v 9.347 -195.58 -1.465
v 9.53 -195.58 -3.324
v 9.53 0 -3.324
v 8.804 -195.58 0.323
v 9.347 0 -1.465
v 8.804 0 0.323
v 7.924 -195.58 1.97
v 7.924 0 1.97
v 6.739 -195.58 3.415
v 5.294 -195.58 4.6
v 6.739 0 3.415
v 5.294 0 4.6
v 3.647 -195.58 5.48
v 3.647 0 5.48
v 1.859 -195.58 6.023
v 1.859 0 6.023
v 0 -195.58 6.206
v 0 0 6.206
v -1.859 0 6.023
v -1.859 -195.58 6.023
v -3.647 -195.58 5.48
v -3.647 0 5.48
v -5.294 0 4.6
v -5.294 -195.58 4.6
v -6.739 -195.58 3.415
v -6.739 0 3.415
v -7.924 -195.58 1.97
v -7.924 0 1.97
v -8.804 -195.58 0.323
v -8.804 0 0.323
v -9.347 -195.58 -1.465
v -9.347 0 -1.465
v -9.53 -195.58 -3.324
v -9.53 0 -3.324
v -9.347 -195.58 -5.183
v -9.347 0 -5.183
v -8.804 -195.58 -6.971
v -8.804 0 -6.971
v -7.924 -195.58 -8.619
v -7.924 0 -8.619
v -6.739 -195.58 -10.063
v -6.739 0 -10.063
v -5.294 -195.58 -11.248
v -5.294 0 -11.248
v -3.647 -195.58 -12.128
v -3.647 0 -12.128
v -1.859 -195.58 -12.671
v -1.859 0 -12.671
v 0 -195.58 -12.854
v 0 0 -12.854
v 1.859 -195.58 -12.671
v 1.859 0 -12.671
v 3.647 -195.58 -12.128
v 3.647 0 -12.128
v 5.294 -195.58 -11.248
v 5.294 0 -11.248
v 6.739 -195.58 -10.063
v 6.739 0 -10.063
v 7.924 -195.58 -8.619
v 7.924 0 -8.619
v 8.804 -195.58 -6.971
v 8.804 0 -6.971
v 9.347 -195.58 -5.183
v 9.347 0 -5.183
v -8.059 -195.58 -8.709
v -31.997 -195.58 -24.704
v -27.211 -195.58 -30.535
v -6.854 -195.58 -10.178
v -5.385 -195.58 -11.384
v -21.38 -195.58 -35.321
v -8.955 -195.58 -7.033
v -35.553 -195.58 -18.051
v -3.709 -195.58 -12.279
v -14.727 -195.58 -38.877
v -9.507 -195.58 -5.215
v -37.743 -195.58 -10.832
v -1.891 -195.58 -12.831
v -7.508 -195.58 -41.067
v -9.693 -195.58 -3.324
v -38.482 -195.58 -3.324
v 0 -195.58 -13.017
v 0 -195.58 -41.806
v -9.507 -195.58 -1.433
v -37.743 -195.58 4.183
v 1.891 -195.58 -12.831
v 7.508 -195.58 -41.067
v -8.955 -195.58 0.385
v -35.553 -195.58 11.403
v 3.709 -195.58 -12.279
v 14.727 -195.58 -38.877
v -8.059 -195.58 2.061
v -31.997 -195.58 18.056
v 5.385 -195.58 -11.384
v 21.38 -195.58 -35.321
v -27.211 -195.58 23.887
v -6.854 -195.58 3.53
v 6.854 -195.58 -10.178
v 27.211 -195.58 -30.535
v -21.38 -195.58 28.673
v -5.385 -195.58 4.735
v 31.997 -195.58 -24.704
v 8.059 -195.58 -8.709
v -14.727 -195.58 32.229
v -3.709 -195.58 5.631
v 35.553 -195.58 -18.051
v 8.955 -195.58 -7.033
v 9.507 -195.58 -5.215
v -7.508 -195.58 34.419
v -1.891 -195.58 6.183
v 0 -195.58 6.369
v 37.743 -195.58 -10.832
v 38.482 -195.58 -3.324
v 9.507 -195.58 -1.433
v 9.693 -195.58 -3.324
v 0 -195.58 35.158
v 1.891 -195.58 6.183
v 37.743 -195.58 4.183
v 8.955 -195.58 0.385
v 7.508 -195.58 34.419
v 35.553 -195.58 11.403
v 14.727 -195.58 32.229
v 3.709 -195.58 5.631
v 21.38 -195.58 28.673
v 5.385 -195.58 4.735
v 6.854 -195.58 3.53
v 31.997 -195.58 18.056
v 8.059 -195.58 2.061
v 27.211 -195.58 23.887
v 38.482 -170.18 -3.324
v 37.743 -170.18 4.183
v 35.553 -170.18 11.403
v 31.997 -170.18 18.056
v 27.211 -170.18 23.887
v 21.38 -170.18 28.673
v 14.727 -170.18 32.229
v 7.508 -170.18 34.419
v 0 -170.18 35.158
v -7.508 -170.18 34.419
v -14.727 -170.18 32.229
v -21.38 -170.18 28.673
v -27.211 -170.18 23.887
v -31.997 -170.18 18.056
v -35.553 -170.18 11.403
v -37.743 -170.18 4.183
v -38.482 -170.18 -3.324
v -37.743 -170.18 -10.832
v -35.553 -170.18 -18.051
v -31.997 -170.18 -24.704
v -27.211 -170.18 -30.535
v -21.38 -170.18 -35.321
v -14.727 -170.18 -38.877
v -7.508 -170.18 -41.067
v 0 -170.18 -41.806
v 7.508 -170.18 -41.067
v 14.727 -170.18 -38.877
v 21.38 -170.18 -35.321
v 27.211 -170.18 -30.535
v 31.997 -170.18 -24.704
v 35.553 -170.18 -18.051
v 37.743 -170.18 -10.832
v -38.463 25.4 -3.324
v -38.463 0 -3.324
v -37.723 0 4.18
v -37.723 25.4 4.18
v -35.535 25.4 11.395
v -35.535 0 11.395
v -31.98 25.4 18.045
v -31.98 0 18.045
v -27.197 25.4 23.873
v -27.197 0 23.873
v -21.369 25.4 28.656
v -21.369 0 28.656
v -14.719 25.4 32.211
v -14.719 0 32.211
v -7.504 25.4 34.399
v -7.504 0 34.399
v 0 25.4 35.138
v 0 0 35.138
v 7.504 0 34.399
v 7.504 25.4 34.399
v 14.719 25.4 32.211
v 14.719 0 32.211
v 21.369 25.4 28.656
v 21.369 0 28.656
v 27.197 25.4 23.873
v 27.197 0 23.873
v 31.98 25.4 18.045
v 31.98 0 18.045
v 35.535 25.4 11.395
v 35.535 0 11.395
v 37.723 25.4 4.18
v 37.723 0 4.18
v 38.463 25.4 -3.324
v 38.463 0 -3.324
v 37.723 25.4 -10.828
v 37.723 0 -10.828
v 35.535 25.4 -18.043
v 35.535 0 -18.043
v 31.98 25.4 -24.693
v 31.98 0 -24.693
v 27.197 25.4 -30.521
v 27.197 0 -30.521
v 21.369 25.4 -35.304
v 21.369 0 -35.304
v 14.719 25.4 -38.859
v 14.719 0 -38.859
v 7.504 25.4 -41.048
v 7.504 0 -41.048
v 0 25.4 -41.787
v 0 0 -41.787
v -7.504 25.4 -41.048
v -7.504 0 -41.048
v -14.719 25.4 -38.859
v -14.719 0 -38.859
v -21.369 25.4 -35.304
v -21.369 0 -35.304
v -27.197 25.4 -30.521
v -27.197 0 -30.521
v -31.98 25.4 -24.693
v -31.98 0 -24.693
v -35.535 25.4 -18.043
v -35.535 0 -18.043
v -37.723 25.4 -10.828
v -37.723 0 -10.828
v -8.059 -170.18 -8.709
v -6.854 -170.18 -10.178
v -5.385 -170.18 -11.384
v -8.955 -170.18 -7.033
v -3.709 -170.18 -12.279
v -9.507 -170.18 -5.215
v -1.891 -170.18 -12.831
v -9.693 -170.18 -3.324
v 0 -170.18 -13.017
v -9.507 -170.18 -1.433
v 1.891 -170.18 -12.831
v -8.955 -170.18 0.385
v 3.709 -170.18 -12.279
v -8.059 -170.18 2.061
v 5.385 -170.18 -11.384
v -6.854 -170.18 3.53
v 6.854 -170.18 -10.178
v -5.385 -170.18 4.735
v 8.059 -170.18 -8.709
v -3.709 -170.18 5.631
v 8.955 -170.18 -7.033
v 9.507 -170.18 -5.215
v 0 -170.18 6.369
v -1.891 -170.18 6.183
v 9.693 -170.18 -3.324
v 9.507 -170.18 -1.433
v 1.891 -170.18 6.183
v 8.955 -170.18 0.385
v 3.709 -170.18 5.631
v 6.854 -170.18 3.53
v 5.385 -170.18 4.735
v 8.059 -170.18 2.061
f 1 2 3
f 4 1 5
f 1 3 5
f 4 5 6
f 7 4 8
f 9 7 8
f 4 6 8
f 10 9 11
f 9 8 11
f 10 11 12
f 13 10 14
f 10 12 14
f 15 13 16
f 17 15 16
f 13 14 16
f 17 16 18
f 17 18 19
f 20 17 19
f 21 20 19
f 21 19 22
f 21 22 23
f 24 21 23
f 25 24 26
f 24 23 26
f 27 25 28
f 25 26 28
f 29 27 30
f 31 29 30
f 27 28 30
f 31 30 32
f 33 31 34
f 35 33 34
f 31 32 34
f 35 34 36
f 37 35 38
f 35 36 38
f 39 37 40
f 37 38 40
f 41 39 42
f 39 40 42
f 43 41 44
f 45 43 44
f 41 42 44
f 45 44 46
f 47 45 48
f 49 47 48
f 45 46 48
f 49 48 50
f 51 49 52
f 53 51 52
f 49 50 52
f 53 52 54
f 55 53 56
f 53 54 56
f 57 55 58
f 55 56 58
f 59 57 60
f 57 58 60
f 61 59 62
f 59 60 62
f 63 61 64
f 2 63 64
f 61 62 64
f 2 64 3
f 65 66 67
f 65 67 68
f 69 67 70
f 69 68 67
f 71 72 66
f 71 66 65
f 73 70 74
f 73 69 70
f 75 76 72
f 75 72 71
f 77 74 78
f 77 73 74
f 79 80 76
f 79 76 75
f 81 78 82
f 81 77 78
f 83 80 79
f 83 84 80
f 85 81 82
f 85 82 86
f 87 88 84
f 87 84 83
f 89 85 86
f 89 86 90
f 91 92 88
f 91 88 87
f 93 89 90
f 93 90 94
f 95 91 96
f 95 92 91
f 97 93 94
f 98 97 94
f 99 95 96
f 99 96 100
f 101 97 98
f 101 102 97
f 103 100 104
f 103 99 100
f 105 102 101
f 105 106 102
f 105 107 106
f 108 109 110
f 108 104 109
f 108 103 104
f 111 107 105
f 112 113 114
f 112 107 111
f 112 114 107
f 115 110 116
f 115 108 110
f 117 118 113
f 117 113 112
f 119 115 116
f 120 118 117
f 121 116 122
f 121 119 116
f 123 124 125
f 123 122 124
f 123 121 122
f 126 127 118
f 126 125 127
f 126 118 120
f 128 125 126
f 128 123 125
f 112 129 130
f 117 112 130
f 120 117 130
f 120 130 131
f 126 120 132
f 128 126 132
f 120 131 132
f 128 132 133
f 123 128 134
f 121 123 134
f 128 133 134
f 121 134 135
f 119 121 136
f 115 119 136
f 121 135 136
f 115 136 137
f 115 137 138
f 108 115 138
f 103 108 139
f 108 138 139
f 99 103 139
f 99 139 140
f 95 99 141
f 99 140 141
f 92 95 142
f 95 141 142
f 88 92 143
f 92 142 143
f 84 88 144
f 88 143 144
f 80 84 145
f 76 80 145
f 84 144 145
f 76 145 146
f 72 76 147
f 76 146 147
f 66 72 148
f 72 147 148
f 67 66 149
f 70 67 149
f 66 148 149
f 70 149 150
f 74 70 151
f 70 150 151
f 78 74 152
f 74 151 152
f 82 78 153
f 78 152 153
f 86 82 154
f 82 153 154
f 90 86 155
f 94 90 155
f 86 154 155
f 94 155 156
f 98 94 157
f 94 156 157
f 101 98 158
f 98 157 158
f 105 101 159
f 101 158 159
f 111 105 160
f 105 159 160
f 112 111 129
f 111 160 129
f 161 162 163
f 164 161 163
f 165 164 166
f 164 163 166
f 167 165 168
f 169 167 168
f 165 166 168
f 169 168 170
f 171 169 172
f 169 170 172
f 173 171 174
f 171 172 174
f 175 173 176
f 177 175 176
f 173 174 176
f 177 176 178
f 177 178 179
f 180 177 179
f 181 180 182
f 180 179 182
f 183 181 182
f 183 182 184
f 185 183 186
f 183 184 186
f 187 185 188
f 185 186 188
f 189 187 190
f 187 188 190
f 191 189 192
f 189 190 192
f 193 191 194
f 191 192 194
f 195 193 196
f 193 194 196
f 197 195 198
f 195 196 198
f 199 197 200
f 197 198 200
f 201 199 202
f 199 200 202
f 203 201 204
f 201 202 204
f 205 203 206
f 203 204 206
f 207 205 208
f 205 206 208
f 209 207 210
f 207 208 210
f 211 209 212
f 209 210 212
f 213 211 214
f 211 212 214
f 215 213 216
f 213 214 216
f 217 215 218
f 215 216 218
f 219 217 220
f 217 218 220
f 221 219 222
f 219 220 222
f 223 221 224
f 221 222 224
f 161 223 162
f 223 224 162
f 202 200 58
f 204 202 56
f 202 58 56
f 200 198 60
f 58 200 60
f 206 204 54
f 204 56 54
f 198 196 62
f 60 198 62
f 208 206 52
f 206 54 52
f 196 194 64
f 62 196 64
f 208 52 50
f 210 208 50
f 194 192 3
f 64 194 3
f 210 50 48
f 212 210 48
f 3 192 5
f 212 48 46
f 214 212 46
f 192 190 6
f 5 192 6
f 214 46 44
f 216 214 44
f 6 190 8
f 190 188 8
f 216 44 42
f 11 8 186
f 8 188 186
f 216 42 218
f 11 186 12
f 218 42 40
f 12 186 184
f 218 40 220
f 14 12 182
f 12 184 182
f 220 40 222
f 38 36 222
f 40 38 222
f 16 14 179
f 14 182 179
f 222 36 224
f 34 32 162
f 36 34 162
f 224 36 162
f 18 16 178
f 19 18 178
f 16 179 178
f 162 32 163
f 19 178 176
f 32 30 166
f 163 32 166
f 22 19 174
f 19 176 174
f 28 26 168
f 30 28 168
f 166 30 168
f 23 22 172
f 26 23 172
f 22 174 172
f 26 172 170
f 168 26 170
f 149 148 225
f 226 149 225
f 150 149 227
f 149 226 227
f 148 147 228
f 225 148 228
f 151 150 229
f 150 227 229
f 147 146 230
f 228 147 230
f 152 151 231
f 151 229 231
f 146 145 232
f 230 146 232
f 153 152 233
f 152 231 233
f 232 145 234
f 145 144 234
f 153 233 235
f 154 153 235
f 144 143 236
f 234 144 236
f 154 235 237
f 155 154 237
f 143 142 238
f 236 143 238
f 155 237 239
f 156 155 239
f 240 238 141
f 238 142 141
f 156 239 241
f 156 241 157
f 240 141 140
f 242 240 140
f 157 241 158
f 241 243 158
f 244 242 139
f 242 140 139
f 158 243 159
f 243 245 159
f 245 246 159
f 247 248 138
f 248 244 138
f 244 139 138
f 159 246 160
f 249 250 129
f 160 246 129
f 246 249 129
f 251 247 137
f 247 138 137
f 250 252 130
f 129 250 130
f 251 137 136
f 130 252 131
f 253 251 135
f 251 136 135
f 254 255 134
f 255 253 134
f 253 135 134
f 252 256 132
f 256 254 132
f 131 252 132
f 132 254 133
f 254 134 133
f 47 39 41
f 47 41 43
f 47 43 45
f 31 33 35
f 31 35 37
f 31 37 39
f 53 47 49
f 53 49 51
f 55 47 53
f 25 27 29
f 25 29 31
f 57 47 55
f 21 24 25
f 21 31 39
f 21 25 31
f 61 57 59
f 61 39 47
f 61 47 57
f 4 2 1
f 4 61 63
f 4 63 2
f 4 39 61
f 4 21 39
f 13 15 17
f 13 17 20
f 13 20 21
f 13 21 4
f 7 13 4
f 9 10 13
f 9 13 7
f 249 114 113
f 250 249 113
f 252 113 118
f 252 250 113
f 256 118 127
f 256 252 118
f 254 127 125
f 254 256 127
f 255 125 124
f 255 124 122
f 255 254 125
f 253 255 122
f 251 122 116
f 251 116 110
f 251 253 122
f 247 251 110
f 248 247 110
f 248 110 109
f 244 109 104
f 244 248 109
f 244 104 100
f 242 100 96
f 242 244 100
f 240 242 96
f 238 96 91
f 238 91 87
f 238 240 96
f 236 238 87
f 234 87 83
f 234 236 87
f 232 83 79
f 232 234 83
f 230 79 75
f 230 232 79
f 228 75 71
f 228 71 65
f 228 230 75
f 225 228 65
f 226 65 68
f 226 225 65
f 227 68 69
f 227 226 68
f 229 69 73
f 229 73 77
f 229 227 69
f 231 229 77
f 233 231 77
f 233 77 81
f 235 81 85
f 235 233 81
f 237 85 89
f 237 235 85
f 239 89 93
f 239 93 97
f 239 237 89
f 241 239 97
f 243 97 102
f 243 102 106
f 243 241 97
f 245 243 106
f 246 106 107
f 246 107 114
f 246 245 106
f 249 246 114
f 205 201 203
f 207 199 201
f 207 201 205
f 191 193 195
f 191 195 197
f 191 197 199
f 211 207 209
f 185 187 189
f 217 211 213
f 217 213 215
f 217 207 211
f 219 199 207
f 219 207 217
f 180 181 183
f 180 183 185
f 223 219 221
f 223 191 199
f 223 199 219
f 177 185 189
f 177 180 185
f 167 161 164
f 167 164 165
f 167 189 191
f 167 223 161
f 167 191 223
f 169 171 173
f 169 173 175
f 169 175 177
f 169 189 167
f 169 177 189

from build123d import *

# Parameters (mm, degrees)
F0_R      = 9.52981
F1_DEPTH  = 170.18
F3_R      = 38.462517
F4_DEPTH  = 25.4
F2_R      = 38.482389
F2_R_2    = 9.693022
F5_DEPTH  = 25.4
F1_FACE_R = 9.52981
F6_DEPTH  = 25.4


with BuildPart() as f1:
    # F0 (on Front) → F1 (new body)
    with BuildSketch(Plane.XZ):
        with Locations((0, -3.324065)):
            Circle(F0_R)
    extrude(amount=F1_DEPTH)

    # F3 (on face) → F4 (join)
    with BuildSketch(Plane(origin=(0, 0, 0), x_dir=(-1, 0, 0), z_dir=(0, 1, 0))):
        with Locations((0, -3.324065)):
            Circle(F3_R)
    extrude(amount=F4_DEPTH)

    # F1_face (on face) → F6 (join)
    with BuildSketch(Plane(origin=(0, -170.18, -3.324065), x_dir=(1, 0, 0), z_dir=(0, -1, 0))):
        Circle(F1_FACE_R)
    extrude(amount=F6_DEPTH)


with BuildPart() as f5:
    # F2 (on face) → F5 (new body)
    with BuildSketch(Plane.XZ.offset(170.18)):
        with Locations((0, -3.324065)):
            Circle(F2_R)
        with Locations((0, -3.324065)):
            Circle(F2_R_2, mode=Mode.SUBTRACT)
    extrude(amount=F5_DEPTH)


solid = Compound([f1.part, f5.part])
